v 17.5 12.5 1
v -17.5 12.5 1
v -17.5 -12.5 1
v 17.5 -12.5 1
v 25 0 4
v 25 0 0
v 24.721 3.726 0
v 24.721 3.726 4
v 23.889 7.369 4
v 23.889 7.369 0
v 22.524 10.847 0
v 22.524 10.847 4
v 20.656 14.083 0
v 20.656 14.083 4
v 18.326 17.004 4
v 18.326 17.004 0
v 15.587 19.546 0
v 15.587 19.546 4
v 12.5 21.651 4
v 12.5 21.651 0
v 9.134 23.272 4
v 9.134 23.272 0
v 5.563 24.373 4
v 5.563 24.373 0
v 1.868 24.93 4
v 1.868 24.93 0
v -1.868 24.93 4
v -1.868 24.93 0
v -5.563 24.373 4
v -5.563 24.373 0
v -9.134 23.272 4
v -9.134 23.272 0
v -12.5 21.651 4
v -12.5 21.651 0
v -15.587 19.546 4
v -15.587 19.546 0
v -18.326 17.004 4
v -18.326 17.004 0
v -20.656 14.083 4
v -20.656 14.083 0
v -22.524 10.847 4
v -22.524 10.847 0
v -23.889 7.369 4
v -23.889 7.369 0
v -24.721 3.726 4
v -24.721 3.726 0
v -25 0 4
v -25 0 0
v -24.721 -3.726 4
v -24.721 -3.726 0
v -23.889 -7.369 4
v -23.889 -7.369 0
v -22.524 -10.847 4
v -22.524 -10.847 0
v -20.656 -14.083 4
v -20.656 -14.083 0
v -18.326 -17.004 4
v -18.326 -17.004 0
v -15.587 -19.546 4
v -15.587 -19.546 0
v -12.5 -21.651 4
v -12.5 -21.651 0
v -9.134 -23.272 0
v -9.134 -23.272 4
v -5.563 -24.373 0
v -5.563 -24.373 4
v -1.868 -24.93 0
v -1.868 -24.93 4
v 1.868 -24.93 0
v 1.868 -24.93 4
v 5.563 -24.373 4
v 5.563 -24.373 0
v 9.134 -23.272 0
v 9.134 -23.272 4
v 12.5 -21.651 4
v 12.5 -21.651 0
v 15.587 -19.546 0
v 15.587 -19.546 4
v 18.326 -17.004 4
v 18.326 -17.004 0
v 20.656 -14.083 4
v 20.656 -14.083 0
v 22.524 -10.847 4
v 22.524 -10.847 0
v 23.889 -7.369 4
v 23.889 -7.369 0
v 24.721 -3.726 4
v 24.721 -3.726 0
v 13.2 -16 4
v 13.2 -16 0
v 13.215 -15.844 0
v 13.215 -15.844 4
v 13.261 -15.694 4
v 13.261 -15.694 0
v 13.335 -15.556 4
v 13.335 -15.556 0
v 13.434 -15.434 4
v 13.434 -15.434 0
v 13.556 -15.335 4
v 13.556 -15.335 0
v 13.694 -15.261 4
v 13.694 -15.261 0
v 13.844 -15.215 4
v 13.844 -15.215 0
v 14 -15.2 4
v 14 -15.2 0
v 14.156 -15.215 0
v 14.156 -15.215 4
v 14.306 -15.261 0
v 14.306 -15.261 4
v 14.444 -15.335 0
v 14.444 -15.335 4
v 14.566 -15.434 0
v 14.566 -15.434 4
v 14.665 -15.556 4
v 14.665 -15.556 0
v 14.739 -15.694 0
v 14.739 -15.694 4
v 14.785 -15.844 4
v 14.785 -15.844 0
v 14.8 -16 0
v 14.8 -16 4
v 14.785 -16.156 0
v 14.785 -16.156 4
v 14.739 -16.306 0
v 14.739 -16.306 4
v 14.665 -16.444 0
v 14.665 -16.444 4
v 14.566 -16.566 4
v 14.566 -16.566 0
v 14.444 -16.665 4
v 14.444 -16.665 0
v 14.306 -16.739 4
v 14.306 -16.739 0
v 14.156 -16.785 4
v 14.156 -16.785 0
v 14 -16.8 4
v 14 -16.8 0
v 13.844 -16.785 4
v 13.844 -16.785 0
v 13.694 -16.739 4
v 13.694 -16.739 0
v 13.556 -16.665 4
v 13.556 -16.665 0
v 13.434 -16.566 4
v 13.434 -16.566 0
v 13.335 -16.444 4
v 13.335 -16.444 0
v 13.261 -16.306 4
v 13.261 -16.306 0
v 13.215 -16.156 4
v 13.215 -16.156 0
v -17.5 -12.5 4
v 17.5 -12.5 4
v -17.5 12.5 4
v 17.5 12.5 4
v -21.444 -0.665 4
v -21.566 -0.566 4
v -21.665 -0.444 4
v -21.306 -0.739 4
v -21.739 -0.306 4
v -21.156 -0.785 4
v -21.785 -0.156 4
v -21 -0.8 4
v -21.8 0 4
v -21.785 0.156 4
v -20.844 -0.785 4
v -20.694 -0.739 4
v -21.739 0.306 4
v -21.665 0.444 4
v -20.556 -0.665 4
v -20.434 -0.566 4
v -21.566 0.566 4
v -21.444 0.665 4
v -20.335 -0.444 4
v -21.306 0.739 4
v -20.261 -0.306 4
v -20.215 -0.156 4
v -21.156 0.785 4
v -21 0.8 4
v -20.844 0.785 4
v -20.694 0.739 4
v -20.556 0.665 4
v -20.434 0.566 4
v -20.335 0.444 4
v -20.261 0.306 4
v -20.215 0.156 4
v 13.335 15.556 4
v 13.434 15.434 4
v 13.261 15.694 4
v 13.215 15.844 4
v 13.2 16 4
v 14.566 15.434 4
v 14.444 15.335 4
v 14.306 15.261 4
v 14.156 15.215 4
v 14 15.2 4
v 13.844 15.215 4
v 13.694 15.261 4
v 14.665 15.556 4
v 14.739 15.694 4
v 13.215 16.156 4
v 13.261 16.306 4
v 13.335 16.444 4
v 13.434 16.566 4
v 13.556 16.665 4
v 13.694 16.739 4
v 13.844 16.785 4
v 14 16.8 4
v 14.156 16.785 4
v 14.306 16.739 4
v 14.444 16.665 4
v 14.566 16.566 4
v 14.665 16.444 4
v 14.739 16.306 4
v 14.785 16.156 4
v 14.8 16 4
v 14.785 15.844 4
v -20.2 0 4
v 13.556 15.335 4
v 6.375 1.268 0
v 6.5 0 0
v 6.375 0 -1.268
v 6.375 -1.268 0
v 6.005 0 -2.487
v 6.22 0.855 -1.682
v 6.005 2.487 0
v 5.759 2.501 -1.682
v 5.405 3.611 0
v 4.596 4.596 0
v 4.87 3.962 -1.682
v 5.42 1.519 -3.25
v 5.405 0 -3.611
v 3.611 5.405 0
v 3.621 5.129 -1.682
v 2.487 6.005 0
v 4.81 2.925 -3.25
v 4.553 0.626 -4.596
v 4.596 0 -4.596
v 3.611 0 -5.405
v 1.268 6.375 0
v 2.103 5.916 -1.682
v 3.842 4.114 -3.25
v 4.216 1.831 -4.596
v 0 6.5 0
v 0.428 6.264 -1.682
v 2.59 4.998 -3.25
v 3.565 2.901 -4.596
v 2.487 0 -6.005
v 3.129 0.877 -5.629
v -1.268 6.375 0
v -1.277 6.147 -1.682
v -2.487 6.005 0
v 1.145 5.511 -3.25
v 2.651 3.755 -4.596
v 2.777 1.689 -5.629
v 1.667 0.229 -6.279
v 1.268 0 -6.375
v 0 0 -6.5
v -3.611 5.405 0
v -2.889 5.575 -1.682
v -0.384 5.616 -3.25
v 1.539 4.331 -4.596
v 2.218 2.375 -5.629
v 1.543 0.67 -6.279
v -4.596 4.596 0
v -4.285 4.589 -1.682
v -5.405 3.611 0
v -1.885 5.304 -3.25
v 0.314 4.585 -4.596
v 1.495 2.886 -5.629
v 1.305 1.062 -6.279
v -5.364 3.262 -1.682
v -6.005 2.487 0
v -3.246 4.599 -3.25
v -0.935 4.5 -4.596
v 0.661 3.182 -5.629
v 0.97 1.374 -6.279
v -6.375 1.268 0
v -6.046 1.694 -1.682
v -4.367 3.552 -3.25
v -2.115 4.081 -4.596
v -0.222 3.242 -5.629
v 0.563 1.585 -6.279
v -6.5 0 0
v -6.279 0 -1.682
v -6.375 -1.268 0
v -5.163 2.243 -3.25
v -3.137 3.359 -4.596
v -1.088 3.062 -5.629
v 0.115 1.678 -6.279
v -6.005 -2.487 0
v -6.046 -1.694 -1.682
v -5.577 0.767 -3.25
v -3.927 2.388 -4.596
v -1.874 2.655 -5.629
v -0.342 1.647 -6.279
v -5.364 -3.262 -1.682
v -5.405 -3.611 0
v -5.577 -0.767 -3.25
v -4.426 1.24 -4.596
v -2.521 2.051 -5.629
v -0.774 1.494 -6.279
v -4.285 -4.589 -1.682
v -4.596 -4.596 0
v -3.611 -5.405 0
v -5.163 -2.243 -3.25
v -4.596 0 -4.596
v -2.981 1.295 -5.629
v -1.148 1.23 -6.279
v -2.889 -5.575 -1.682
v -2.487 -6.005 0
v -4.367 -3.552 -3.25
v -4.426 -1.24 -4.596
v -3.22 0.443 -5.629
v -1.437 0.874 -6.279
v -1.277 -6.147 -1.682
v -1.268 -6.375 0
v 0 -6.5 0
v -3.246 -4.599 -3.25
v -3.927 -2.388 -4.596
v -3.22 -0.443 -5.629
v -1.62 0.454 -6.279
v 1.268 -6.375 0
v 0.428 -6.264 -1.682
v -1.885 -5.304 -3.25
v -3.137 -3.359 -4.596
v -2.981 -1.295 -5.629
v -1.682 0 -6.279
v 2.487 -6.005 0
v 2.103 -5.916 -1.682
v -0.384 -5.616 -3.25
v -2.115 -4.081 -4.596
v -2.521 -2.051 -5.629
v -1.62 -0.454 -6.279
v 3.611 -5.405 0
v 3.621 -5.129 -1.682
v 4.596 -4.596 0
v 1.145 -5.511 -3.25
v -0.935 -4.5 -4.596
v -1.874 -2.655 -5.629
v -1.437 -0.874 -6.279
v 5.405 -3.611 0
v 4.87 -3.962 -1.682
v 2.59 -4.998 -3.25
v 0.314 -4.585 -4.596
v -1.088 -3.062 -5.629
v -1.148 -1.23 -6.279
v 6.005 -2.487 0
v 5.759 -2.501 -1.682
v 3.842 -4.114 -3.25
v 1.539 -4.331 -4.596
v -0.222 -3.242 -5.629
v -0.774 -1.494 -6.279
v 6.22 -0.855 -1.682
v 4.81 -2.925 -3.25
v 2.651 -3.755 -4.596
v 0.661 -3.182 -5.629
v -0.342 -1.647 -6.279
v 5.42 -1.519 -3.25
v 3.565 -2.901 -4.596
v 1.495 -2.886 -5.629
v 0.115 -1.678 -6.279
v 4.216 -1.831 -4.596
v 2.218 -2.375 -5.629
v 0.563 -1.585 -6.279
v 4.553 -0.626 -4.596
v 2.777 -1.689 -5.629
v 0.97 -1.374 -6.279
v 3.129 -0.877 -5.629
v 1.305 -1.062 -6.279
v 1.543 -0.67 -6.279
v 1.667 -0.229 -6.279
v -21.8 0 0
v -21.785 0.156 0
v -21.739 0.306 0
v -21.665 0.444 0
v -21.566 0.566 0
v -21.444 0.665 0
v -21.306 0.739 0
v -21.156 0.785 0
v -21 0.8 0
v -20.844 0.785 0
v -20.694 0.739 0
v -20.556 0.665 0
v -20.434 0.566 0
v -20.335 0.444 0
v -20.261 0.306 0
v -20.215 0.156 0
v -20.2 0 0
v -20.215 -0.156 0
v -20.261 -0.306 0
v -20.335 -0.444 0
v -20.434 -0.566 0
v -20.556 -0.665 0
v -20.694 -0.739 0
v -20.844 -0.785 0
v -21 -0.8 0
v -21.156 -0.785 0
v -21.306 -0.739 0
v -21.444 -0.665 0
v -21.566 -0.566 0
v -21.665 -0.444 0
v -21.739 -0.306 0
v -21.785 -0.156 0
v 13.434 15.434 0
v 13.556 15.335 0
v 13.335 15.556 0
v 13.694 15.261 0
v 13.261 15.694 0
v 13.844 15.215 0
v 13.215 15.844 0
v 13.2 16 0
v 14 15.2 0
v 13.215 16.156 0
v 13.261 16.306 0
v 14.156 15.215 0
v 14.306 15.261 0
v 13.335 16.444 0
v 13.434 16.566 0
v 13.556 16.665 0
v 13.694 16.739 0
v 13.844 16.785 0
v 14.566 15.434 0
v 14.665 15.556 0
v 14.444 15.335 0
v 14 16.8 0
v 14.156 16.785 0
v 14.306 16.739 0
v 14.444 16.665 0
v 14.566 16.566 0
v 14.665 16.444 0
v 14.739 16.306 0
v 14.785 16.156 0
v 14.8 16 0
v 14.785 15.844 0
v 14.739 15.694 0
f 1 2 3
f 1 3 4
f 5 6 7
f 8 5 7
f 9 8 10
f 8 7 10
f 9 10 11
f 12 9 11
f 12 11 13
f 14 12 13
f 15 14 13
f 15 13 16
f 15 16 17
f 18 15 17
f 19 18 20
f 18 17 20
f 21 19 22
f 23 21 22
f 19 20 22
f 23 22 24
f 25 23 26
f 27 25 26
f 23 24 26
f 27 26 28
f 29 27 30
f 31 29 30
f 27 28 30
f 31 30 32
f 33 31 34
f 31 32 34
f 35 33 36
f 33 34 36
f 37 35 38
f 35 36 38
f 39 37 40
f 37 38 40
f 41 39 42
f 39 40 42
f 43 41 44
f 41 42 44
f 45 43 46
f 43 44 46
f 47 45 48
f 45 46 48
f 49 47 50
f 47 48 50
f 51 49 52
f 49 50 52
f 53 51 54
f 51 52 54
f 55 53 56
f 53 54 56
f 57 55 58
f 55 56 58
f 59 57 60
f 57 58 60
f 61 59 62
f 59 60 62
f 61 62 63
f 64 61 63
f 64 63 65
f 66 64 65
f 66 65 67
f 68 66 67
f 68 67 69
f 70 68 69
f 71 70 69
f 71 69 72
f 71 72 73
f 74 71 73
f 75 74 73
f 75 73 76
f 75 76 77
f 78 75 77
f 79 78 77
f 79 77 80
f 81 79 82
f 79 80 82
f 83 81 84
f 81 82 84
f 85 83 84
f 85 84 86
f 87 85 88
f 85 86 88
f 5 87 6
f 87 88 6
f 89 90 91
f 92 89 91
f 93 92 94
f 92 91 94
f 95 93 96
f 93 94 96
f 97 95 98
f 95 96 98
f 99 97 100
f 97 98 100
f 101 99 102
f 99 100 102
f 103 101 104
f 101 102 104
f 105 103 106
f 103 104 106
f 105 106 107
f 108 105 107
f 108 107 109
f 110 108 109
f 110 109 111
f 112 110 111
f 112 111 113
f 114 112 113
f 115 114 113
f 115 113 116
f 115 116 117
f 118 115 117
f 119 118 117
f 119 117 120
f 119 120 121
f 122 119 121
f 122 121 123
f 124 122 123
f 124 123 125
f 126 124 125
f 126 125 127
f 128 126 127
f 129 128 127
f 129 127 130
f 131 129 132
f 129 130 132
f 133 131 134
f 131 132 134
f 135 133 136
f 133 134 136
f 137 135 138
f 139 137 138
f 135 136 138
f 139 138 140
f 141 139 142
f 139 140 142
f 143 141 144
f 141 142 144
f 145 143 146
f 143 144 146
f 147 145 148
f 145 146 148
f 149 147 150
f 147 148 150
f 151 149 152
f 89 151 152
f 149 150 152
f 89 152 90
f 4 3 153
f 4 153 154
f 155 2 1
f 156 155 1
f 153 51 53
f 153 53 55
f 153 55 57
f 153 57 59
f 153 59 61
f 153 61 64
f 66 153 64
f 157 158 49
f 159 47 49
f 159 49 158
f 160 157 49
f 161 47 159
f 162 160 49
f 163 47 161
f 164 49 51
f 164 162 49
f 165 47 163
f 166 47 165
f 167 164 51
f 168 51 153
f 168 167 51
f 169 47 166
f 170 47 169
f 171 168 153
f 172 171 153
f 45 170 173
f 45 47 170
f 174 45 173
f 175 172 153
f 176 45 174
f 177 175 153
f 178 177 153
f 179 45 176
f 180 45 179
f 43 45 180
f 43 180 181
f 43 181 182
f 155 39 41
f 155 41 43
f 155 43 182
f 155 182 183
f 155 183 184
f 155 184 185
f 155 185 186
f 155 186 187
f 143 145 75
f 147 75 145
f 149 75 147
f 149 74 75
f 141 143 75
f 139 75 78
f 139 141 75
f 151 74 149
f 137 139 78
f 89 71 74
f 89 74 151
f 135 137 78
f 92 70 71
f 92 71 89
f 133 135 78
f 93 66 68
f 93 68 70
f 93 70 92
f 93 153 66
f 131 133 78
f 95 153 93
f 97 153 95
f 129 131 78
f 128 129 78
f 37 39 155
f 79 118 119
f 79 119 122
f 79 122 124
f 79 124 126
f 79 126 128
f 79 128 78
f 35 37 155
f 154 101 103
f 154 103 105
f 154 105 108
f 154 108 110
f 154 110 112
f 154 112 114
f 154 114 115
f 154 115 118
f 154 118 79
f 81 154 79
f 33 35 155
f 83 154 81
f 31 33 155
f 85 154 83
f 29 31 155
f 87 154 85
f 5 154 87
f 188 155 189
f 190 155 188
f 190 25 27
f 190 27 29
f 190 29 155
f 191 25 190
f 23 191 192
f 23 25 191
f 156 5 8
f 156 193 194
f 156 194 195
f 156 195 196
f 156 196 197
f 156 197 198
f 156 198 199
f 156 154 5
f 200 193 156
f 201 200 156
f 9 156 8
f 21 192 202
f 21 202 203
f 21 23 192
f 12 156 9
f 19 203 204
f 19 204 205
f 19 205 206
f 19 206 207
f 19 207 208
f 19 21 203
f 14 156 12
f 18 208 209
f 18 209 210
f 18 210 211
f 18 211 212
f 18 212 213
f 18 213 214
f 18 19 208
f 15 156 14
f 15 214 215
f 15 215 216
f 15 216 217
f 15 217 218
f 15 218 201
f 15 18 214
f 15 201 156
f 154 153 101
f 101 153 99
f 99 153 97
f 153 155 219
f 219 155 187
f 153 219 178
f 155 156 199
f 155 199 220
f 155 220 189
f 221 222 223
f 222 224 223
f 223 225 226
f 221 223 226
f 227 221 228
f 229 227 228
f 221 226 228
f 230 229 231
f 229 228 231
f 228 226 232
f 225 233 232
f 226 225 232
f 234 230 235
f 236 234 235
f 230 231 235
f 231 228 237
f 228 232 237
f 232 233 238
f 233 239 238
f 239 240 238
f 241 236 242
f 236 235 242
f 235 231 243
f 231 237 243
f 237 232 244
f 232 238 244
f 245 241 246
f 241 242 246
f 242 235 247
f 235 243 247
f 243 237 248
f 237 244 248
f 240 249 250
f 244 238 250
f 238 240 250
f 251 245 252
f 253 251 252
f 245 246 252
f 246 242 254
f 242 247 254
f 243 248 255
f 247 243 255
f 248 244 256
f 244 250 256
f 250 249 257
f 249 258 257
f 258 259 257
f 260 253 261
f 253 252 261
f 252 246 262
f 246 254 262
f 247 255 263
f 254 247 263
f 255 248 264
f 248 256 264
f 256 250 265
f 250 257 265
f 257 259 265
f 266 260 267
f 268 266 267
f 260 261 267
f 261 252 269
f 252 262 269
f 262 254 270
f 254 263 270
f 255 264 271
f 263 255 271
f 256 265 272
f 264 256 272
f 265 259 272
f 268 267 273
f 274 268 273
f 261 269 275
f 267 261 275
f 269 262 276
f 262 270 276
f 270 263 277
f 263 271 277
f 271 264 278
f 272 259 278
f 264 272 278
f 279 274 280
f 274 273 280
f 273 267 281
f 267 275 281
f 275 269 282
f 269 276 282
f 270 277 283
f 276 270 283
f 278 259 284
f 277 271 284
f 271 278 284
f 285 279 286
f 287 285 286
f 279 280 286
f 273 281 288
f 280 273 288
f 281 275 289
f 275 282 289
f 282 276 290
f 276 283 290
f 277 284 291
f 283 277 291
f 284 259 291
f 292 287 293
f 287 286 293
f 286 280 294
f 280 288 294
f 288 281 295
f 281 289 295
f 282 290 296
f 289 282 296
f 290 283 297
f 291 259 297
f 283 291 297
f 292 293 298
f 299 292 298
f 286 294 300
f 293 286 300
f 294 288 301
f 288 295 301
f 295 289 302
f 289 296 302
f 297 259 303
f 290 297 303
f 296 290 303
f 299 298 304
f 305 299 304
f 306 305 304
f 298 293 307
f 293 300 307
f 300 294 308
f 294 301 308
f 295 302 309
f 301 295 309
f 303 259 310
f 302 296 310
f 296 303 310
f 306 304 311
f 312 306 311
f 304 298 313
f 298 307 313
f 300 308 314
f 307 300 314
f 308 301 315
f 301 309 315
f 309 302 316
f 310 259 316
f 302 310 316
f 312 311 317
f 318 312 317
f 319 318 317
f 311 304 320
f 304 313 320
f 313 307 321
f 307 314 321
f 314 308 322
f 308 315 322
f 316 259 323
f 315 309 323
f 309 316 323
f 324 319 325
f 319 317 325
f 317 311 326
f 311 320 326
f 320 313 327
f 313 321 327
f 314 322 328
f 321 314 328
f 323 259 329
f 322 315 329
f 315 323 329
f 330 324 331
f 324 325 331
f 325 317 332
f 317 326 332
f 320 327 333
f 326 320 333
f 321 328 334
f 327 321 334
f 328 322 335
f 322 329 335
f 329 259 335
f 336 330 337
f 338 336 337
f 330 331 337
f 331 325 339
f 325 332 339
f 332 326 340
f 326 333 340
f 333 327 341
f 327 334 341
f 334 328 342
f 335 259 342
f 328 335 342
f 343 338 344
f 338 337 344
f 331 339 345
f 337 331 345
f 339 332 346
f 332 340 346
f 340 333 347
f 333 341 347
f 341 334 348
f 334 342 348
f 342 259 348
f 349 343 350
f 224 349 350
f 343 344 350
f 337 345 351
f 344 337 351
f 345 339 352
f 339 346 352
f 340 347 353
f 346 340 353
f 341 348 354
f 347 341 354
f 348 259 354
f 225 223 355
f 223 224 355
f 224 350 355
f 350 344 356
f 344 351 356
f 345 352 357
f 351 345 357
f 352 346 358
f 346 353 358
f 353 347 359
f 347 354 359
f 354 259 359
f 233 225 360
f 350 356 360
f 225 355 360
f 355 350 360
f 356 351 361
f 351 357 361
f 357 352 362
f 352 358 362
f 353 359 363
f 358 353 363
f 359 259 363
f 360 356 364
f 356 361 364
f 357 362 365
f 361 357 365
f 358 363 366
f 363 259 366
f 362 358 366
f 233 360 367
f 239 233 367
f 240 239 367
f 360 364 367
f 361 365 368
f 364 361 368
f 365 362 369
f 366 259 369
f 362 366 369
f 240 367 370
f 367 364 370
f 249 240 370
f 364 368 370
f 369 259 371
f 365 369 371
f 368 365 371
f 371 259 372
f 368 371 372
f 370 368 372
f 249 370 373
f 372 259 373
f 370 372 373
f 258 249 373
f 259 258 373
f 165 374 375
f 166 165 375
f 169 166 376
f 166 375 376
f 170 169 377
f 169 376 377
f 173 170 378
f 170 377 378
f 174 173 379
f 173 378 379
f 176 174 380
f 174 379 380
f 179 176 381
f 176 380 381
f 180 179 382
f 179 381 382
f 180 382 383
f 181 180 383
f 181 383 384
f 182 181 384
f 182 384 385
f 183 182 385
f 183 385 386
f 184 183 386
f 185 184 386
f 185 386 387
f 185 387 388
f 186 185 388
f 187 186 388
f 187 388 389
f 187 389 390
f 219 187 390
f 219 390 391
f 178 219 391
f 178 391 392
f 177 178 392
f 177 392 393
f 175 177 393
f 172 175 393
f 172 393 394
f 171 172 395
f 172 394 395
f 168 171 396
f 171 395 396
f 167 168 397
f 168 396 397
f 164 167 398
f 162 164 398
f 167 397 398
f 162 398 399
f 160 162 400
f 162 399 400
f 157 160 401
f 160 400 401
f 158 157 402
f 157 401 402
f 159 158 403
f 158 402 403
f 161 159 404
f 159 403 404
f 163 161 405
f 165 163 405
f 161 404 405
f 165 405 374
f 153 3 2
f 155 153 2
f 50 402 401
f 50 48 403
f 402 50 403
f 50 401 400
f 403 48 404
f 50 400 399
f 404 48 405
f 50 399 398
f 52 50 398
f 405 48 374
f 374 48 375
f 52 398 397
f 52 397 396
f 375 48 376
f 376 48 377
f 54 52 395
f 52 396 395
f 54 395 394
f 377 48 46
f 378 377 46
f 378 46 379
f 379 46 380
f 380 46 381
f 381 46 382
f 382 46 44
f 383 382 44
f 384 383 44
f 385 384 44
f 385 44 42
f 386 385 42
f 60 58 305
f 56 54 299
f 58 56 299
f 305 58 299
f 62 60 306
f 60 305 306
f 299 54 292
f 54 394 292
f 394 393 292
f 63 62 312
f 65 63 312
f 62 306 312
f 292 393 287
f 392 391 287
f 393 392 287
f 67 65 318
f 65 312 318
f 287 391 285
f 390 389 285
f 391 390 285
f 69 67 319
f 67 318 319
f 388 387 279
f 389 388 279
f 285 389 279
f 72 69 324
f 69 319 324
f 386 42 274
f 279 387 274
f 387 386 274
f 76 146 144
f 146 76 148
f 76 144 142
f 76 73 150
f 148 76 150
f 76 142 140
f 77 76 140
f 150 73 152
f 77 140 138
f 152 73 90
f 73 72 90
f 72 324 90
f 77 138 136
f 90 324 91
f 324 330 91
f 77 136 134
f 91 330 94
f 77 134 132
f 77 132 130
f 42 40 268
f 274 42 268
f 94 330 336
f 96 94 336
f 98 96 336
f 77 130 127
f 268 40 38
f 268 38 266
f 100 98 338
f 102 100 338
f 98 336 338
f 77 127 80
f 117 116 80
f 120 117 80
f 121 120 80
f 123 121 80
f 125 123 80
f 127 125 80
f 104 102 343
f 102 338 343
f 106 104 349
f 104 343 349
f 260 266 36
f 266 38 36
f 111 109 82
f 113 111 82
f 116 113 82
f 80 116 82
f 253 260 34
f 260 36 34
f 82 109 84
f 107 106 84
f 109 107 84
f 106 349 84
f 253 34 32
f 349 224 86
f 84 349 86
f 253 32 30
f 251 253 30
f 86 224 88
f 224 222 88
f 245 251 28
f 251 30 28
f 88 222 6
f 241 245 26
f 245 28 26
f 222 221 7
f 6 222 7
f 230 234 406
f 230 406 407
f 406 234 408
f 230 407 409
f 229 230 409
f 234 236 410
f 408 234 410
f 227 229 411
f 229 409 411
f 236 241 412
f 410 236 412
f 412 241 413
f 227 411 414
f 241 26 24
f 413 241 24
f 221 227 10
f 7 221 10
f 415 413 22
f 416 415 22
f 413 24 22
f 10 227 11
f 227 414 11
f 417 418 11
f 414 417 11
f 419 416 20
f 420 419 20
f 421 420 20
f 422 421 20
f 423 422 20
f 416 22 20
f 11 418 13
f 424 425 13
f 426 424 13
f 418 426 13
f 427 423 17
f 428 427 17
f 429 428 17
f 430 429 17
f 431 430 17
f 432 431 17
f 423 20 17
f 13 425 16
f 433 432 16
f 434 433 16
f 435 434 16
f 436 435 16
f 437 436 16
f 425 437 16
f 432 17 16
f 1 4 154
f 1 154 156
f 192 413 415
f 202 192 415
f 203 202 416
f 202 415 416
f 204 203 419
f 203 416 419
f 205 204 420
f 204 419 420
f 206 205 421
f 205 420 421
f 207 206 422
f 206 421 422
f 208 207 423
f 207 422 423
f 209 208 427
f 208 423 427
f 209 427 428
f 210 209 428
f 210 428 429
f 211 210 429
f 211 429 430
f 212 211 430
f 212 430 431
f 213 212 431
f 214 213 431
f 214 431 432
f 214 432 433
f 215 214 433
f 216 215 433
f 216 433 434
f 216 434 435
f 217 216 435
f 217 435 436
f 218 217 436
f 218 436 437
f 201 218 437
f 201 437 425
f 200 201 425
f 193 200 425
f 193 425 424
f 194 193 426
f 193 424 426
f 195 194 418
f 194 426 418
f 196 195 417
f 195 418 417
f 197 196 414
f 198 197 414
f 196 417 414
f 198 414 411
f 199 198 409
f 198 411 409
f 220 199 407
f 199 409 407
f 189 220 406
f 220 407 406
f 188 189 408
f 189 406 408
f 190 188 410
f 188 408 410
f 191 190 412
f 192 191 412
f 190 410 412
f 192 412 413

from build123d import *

# Parameters (mm, degrees)
SKETCH1_R             = 25
SKETCH1_W             = 35
SKETCH1_H             = 25
BOSS_EXTRUDE1_DEPTH   = 4
SKETCH1_3_W           = 35
SKETCH1_3_H           = 25
BOSS_EXTRUDE2_DEPTH   = 1
M2X0_4_TAPPED_HOLE1_D = 1.6


with BuildPart() as part:
    # Sketch1 → Boss-Extrude1 (new body)
    with BuildSketch(Plane.XY):
        Circle(SKETCH1_R)
        Rectangle(SKETCH1_W, SKETCH1_H, mode=Mode.SUBTRACT)
    extrude(amount=BOSS_EXTRUDE1_DEPTH)

    # Sketch1<3> → Boss-Extrude2 (add)
    with BuildSketch(Plane.XY):
        Rectangle(SKETCH1_3_W, SKETCH1_3_H)
    extrude(amount=BOSS_EXTRUDE2_DEPTH)

    # Sketch2 → Revolve1 (revolve)
    with BuildSketch(Plane(origin=(0, 0, 0), x_dir=(1, 0, 0), z_dir=(0, 1, 0))):
        with BuildLine():
            Line((0, 6.5), (0, 0))
            Line((0, 0), (-6.5, 0))
            ThreePointArc((-6.5, 0), (-4.596194078, 4.596194078), (0, 6.5))
        make_face()
    revolve(axis=Axis((0, 0, -15), (0, 0, 1)))

    # M2x0.4 Tapped Hole1 (through all)
    with Locations(Plane.XY.offset(4)):
        with Locations((-21, 0), (14, -16), (14, 16)):
            Hole(M2X0_4_TAPPED_HOLE1_D / 2)


solid = part.part
